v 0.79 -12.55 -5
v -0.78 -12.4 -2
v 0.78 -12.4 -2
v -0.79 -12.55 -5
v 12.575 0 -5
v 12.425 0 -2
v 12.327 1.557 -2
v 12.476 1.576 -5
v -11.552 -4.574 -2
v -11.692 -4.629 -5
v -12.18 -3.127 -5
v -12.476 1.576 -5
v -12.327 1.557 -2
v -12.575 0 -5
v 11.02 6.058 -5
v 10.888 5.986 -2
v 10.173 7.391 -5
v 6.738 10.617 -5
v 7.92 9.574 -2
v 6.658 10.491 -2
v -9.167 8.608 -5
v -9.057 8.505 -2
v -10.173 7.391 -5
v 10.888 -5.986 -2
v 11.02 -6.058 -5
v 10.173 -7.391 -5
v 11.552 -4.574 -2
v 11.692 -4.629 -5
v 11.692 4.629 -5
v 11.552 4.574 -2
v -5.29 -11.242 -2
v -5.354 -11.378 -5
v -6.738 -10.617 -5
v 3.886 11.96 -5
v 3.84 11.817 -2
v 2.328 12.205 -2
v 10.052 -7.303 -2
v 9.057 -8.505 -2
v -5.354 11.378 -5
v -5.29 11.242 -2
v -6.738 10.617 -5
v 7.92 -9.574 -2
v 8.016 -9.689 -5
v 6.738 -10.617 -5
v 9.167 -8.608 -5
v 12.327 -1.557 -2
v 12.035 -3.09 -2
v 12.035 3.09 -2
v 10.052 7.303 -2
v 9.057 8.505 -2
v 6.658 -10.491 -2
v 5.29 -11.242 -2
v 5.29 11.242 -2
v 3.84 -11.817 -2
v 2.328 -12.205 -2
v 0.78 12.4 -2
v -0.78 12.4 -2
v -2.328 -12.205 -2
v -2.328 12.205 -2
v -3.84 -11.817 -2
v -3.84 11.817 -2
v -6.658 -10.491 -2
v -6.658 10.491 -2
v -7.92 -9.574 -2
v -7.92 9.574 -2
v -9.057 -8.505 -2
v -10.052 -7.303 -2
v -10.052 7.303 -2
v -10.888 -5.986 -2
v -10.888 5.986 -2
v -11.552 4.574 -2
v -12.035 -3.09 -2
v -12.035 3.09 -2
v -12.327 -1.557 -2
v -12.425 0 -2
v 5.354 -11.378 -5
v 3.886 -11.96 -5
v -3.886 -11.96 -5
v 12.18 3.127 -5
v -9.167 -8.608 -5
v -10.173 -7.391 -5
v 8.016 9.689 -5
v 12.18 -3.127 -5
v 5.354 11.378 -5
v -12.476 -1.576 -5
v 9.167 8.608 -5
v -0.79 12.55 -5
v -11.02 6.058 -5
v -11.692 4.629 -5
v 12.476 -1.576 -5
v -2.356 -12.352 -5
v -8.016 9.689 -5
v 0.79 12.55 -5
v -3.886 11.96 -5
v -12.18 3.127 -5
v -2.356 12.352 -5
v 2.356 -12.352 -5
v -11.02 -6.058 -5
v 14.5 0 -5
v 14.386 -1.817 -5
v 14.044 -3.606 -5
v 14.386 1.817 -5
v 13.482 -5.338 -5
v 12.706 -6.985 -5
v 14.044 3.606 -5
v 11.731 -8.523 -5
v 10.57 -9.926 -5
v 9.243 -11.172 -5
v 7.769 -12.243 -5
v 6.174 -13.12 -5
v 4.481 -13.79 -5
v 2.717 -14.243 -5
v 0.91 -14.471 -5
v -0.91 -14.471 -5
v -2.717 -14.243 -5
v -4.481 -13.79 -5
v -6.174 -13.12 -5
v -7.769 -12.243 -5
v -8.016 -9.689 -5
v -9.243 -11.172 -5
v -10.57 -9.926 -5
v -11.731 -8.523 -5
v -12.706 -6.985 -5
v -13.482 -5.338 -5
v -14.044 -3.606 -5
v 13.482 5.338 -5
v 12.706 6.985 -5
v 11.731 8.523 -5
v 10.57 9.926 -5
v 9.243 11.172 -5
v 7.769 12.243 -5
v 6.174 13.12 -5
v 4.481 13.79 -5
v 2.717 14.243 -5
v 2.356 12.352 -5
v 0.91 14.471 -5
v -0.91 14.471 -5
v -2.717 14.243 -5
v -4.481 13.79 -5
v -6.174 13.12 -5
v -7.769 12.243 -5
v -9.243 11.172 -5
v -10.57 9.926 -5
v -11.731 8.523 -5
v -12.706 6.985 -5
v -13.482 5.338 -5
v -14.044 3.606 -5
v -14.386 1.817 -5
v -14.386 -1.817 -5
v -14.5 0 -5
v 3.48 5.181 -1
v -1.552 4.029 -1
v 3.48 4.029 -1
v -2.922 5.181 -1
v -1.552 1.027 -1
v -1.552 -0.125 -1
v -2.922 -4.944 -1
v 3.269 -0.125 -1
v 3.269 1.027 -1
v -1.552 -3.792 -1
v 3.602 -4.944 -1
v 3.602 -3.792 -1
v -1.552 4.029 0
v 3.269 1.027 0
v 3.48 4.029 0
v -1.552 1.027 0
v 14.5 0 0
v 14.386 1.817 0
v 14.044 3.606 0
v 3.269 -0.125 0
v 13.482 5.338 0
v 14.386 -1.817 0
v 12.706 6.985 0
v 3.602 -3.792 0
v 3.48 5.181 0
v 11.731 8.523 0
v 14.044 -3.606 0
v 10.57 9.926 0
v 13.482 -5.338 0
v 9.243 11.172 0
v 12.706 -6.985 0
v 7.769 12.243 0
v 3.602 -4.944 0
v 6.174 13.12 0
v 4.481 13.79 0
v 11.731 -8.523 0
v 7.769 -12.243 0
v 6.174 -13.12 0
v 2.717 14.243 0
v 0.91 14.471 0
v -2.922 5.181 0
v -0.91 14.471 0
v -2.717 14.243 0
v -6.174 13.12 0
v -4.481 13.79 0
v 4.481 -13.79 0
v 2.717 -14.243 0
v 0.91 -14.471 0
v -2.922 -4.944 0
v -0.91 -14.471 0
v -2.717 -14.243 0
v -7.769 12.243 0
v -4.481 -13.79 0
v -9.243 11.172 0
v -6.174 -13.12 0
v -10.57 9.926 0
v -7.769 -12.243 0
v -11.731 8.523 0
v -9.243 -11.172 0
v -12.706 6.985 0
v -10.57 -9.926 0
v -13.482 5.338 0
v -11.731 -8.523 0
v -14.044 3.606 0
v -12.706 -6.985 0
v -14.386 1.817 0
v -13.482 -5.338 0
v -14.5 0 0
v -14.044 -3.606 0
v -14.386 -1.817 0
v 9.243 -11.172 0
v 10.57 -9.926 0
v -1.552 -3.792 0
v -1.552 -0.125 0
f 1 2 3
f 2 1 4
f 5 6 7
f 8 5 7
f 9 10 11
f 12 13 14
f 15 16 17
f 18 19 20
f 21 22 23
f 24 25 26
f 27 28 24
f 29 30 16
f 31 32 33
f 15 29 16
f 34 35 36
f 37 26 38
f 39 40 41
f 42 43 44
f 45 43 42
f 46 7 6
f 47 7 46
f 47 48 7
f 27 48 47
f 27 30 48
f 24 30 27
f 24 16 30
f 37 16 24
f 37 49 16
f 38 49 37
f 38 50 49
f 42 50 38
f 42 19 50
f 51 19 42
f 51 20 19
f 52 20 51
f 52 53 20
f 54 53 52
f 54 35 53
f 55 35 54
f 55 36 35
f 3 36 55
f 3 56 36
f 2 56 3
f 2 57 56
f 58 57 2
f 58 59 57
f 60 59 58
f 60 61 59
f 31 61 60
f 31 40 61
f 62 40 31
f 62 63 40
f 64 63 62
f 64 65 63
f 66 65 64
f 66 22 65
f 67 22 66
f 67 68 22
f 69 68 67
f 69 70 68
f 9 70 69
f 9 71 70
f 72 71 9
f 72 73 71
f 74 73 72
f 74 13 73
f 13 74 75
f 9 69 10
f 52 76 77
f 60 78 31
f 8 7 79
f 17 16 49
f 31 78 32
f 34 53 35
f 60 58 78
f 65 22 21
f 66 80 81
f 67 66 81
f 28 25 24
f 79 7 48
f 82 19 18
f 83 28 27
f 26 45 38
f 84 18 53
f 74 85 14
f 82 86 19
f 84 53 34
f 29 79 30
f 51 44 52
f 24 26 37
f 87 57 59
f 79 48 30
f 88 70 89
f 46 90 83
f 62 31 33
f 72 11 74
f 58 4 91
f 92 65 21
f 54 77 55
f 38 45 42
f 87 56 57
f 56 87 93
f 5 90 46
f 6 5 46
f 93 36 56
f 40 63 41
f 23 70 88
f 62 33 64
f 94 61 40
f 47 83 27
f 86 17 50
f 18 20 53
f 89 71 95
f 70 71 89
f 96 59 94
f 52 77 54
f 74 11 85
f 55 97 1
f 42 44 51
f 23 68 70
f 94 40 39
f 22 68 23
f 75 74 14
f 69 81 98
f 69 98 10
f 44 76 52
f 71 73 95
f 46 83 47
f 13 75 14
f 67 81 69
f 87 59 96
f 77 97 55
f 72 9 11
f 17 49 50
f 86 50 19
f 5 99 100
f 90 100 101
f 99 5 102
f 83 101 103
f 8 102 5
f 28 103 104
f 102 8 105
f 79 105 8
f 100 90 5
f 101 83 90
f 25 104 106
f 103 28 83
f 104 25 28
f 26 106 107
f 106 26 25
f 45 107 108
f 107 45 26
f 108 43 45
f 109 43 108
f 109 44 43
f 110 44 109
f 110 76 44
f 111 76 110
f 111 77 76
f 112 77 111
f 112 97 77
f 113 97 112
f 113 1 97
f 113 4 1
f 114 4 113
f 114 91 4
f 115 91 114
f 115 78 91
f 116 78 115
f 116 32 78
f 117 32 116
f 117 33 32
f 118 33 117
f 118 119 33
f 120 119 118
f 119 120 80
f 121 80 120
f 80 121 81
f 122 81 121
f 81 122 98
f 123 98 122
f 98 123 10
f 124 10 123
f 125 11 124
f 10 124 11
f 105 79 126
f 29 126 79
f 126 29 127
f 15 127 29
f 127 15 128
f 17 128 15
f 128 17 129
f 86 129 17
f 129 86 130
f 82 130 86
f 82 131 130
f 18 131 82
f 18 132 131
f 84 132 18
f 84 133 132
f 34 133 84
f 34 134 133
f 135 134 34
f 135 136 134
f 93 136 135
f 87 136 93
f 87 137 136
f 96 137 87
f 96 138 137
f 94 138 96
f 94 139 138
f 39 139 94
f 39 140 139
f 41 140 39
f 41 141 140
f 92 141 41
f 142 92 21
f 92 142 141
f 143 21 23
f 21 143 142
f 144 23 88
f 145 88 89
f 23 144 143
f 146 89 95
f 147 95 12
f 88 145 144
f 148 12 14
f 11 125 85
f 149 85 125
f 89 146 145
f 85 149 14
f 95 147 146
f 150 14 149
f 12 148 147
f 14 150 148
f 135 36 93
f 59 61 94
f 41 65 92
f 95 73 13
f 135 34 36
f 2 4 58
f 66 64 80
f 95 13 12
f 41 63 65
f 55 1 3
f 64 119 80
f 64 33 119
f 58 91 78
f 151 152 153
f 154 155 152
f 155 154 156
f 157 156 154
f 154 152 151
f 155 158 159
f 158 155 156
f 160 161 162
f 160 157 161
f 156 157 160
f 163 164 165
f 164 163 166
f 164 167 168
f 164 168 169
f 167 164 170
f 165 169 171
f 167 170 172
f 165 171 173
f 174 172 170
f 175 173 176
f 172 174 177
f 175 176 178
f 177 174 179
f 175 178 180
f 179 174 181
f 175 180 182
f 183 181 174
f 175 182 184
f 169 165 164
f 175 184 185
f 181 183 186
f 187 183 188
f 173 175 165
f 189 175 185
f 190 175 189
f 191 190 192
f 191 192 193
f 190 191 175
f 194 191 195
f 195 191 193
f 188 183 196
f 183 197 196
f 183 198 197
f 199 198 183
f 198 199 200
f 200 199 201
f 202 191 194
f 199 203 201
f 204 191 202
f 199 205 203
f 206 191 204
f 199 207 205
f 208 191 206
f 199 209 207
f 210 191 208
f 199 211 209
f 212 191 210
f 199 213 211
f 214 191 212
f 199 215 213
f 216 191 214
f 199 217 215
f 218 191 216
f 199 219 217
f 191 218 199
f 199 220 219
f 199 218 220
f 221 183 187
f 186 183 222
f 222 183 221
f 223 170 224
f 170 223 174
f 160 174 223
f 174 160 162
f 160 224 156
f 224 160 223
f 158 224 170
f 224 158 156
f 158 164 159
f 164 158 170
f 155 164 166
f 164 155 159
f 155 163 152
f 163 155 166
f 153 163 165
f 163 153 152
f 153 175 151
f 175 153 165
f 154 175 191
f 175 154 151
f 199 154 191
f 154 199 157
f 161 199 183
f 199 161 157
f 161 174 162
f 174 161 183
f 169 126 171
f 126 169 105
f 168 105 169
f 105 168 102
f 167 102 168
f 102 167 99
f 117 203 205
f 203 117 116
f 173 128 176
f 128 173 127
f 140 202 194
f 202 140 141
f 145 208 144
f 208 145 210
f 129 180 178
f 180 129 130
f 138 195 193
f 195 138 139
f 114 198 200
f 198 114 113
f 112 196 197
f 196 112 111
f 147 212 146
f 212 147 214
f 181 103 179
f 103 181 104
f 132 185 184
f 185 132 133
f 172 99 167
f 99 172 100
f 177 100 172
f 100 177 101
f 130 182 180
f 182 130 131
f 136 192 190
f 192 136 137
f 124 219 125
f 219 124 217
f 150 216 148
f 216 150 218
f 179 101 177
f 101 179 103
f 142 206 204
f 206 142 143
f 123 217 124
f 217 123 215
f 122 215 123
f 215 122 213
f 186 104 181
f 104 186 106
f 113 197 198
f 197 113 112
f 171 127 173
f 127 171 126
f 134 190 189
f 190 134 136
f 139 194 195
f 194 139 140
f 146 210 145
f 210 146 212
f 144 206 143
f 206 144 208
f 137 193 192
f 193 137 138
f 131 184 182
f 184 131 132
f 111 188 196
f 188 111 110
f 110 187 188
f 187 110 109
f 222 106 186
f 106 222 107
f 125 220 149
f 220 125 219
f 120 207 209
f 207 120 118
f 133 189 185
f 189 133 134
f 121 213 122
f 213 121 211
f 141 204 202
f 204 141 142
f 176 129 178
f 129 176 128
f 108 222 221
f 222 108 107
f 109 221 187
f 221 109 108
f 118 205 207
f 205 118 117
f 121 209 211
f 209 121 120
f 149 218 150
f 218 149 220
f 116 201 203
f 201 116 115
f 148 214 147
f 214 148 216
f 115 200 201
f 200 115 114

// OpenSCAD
$fn = 50;

difference() {
	union() {
		translate(v = [0, 0, -5.0]) {
			cylinder(h = 5, r = 14.5);
		}
	}
	union() {
		#translate(v = [0, 0, -5.0]) {
			cylinder(h = 3, r1 = 12.575, r2 = 12.425);
		}
		translate(v = [0, 0, -1]) {
			linear_extrude(height = 1) {
				text(font = "Impact", halign = "center", size = 10, text = "E", valign = "center");
			}
		}
	}
}
